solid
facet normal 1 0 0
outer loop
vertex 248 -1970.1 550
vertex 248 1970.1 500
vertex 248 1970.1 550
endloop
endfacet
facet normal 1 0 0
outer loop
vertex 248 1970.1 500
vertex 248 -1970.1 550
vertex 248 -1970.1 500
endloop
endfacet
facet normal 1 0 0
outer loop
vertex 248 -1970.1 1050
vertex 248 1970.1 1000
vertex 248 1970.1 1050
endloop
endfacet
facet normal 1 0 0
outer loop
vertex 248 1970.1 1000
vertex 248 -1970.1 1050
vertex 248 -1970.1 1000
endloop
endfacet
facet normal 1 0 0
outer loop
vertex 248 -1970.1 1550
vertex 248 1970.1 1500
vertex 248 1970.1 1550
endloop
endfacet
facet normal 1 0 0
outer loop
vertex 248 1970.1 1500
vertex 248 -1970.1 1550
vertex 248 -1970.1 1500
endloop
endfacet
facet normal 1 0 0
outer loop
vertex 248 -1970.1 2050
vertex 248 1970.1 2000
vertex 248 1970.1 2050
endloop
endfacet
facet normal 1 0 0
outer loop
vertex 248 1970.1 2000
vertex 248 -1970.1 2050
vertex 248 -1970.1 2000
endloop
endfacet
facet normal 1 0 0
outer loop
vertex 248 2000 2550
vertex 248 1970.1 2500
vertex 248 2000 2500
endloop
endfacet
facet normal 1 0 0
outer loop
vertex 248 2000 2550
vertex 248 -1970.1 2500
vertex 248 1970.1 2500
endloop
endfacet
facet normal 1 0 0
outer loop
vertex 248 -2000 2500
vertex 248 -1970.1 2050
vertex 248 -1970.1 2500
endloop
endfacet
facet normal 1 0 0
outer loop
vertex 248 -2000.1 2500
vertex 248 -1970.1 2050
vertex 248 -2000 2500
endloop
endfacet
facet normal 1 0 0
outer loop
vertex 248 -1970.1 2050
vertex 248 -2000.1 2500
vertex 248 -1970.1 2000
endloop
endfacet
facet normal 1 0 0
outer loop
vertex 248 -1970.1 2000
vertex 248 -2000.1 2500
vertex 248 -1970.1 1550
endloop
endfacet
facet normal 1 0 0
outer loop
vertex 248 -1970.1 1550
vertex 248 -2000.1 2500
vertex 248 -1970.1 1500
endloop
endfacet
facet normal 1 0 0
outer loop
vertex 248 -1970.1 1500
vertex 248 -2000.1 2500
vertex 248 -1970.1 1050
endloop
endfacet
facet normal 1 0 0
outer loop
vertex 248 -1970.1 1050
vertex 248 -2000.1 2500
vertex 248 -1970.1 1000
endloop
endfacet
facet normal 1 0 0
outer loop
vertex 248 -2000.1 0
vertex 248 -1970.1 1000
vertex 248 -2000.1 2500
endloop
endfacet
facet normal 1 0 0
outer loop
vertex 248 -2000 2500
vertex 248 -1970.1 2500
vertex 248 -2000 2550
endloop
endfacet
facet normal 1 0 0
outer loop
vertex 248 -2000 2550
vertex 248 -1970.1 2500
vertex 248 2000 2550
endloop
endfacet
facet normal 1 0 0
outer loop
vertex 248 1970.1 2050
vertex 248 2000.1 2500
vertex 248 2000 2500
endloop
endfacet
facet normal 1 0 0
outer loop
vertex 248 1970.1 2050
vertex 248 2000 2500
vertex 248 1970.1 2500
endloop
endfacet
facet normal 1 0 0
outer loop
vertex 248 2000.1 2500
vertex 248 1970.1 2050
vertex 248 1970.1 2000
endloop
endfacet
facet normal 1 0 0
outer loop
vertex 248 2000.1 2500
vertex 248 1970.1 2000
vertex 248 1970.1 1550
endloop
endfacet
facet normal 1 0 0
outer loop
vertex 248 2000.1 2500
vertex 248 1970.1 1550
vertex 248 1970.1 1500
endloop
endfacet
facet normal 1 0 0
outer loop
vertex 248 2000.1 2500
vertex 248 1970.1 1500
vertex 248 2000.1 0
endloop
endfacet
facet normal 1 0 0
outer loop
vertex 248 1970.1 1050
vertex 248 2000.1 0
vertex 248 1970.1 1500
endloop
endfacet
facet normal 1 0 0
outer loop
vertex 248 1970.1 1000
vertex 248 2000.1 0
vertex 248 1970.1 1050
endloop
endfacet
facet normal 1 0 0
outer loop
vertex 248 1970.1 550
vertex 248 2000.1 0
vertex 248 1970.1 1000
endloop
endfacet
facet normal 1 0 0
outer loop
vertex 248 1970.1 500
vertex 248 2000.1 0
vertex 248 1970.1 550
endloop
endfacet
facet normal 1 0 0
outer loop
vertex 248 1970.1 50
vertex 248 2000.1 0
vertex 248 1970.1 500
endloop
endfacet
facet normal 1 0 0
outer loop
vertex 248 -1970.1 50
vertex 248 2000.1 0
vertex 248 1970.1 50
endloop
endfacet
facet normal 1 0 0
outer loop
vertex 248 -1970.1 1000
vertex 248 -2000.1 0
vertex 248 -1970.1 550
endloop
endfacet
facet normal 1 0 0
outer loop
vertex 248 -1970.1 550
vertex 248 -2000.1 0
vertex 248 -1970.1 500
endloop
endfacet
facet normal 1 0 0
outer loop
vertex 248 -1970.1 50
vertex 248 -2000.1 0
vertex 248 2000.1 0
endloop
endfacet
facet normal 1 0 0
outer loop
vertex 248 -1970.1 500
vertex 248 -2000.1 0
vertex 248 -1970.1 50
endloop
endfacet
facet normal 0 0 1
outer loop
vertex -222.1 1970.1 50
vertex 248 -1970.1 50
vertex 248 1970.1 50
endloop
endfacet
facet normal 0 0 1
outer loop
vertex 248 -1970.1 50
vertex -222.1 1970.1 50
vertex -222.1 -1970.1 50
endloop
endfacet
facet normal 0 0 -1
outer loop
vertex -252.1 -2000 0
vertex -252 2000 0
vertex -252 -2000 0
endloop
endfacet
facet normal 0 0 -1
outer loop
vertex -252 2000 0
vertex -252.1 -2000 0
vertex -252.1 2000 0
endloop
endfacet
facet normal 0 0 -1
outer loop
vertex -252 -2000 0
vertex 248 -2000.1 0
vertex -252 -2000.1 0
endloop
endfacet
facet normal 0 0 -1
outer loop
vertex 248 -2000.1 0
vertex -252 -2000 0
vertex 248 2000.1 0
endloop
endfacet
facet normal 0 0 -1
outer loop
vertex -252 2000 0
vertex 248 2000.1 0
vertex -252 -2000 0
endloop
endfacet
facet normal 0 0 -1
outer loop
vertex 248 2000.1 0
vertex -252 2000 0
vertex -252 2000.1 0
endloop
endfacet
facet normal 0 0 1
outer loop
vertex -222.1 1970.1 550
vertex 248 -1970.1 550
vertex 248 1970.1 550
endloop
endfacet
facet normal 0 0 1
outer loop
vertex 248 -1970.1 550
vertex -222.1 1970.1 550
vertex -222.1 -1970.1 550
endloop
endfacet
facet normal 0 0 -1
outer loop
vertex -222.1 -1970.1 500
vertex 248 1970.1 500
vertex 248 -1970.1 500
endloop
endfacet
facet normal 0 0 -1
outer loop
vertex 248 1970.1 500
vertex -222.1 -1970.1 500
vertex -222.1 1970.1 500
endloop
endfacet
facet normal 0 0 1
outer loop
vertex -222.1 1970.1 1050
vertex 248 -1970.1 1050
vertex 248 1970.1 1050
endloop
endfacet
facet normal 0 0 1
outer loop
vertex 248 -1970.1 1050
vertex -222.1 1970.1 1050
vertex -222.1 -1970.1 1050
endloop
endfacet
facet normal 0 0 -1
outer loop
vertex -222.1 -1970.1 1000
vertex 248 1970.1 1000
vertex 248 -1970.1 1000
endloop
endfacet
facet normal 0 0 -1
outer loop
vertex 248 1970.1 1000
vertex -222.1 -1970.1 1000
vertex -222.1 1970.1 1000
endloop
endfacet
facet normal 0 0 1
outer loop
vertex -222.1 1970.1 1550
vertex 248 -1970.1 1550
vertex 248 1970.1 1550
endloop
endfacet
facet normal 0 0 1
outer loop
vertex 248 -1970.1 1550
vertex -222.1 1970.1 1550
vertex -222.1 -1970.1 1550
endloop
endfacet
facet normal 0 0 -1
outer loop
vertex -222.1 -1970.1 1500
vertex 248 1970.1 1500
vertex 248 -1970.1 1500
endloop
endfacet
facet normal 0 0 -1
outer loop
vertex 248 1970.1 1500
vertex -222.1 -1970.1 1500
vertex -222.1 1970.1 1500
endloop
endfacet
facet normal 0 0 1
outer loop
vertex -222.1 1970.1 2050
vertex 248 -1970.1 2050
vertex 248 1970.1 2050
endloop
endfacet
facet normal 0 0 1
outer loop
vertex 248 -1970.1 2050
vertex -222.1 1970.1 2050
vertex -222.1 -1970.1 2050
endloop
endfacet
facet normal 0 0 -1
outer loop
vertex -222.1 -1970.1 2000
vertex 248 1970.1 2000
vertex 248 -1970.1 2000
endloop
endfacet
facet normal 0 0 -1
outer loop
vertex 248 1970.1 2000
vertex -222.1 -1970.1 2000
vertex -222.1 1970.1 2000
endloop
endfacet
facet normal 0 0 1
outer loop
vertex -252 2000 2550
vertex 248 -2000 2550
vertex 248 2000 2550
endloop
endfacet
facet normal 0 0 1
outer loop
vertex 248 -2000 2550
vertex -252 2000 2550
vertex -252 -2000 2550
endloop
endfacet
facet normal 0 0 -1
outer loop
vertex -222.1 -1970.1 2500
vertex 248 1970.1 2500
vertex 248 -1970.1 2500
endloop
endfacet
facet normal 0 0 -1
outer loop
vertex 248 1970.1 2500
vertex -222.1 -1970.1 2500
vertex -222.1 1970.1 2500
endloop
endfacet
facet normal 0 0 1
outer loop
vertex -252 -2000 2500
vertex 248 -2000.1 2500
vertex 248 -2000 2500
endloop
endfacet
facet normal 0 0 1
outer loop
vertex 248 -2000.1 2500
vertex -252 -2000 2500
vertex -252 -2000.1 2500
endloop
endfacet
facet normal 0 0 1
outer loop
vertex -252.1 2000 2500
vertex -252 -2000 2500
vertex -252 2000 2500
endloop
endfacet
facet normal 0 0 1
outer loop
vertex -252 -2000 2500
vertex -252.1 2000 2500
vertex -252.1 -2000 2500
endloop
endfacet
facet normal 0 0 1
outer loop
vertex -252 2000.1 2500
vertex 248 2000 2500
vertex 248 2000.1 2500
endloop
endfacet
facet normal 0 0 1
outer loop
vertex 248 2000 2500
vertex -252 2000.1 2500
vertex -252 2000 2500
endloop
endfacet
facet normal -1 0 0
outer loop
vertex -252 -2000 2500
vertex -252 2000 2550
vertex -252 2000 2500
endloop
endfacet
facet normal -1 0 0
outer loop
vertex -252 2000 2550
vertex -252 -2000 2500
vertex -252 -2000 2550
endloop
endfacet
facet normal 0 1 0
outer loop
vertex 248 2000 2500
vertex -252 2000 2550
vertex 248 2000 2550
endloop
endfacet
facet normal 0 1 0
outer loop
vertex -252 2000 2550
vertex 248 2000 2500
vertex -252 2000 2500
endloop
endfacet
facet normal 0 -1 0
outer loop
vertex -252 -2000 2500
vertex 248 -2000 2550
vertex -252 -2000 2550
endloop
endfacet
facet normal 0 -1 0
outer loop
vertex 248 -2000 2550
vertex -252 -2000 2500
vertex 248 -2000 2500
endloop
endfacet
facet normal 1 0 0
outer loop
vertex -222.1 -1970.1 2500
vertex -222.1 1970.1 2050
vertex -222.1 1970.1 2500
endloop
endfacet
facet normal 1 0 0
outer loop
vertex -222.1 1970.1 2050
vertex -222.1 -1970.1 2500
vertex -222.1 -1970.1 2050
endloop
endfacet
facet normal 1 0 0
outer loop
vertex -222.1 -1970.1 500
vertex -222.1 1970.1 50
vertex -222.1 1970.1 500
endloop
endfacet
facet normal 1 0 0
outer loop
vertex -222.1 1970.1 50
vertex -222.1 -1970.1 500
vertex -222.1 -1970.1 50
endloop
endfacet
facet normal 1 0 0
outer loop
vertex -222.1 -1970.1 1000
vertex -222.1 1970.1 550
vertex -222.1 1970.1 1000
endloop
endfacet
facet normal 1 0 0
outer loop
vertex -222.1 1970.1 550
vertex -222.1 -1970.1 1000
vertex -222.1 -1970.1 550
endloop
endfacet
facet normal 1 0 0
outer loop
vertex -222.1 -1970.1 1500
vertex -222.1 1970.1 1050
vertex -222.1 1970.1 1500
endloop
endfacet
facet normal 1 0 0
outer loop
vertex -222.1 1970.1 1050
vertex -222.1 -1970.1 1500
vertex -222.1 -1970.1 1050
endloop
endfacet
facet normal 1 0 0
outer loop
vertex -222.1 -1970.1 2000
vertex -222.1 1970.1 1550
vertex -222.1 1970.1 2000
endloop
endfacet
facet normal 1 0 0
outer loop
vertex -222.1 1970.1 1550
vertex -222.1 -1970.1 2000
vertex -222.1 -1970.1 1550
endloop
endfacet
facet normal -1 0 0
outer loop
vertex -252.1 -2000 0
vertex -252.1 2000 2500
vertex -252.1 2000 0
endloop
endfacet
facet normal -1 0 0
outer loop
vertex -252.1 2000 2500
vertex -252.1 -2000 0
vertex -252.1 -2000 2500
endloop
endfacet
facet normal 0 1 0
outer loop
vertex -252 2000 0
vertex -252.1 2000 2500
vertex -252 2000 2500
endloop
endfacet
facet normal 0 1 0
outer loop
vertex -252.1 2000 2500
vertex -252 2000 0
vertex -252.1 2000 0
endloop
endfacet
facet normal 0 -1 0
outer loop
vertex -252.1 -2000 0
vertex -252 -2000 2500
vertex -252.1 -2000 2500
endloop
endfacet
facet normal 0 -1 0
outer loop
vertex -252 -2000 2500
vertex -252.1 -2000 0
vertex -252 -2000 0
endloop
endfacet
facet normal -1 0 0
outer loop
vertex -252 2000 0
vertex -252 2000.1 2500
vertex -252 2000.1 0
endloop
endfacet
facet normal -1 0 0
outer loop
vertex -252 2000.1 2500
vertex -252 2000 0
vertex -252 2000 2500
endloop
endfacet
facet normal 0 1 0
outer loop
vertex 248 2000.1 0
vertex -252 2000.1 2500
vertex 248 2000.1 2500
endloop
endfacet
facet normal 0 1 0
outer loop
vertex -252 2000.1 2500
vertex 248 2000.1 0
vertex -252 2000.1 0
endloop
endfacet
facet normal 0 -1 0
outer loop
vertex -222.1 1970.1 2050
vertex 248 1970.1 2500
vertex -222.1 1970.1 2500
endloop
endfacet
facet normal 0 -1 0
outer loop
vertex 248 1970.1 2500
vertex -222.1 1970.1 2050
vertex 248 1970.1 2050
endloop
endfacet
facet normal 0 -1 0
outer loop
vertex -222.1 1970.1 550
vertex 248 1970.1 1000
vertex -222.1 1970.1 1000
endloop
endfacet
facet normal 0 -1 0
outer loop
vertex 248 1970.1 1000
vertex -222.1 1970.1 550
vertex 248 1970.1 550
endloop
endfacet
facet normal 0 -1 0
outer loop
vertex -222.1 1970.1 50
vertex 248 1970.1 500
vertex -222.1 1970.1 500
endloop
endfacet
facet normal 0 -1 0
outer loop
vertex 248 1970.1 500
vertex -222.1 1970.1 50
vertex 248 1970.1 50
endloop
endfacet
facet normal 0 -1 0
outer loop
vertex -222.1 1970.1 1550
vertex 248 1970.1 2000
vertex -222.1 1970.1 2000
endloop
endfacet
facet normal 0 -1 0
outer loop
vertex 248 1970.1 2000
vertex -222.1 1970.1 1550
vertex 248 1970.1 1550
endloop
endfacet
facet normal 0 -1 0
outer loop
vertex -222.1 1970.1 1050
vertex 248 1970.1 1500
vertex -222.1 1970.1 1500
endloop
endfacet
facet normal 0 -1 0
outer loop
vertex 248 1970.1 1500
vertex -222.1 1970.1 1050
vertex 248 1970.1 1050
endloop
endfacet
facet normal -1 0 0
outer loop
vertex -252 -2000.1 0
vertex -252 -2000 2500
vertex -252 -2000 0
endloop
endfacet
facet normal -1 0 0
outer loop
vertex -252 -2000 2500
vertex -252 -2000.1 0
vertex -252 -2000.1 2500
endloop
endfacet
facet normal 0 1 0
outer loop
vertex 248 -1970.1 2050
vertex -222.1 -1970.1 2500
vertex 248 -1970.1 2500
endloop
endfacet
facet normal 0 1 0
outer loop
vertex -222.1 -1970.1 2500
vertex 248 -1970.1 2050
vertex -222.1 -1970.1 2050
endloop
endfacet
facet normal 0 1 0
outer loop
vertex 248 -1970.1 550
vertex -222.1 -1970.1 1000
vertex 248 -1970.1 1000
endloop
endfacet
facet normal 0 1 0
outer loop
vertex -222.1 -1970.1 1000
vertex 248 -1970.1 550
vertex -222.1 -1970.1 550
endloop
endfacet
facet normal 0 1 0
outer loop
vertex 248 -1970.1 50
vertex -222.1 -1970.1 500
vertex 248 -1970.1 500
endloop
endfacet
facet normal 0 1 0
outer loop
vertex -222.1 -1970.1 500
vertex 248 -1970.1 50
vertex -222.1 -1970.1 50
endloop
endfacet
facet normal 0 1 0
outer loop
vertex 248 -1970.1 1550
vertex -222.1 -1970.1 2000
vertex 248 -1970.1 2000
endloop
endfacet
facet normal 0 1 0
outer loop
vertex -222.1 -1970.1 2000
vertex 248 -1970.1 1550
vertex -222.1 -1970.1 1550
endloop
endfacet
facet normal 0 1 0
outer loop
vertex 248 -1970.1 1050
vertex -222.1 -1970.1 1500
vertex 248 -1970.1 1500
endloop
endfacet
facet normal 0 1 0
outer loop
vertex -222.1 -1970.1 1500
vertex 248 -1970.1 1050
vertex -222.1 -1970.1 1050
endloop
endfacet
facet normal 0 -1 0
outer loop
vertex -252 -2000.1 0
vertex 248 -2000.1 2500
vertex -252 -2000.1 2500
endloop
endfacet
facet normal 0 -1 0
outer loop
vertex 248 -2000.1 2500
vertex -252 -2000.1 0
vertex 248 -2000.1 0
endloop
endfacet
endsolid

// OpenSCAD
// file: barhocker.scad
// scale( [0.001, 0.001, 0.001] )
//  barhocker();
//eps = 1;
//fn = 40;

module barhocker( foot_diameter=500, foot_height=50,
                  foot_rest_diameter = 400, foot_rest_height = 300, foot_rest_thickness = 20,
                  pillar_diameter=70, pillar_height=800,
                  seat_diameter=400, seat_height=130 ) 
{
  color( [0.9, 0.9, 0.9] ) 
    cylinder( d=foot_diameter, h=foot_height, center=false, $fn=fn );
  color( [0.9, 0.9, 0.9] ) 
    translate( [0,0,foot_height-eps] )
      cylinder( d=pillar_diameter, h=pillar_height, center=false, $fn=fn );
  color( [0.9, 0.9, 0.9] ) 
    difference() {
      translate( [0,0,foot_rest_height] )
        cylinder( d=foot_rest_diameter, h=foot_rest_thickness, center=false, $fn=fn );
      translate( [0,0,foot_rest_height-eps] )
        cylinder( d=foot_rest_diameter-2*foot_rest_thickness, 
                  h=foot_rest_thickness+4*eps, center=false, $fn=fn );
      }
  color( [0.6, 0.2, 0.2] ) 
    translate( [0,0,foot_height+pillar_height-eps] )
      cylinder( d=seat_diameter, h=seat_height, center=false, $fn=fn );
}
// main file
fn = 50;
eps = 0.1;

include <barhocker.scad>;



// scale( [0.001, 0.001, 0.001] ) 
//   bartresen();


translate( [-2.0,0,0] )
  // scale( [0.001, 0.001, 0.001] ) 
    cupboard();

/*

//translate( [-1.0, -4.0,,0] )
//  scale( [0.001, 0.001, 0.001] ) side_barrier();
translate( [-1.0, +2.5,,0] )
  scale( [0.001, 0.001, 0.001] ) side_barrier();

translate( [1.0, -1.0, 0.0] )
  scale( [0.001, 0.001, 0.001] ) barhocker();
translate( [1.0, 0.0, 0.0] )
  scale( [0.001, 0.001, 0.001] ) barhocker();
translate( [1.0, 1.0, 0.0] )
  scale( [0.001, 0.001, 0.001] ) barhocker();
*/



module bartresen(
  tresen_length = 3000,
  tresen_width  =  800,
  tresen_height = 1200,
  base_height = 50,        // height of bottom/footer part of the Tresen
  counter_height = 100,    // height of upper table-plate of the Tresen
  inset_height = 500, // clear height of one cupboard on robot side
)
{
  dx = 300; 
  difference() {
    union() {
      color( [0.6, 0.4, 0.2] ) 
        translate( [0,0,tresen_height/2] ) 
          cube( size=[tresen_width, tresen_length, tresen_height], center=true );
      color( [0.6, 0.4, 0.2] ) 
        translate( [0,tresen_length/2,tresen_height/2] ) 
          cylinder( d=tresen_width, h=tresen_height-eps, center=true, $fn = fn );
      color( [0.6, 0.4, 0.2] ) 
        translate( [0,-tresen_length/2,tresen_height/2] ) 
          cylinder( d=tresen_width, h=tresen_height-eps, center=true, $fn = fn );
    }
    translate( [tresen_width/2-dx/2+eps,0,tresen_height/2-base_height/2] )
      cube( size=[dx+10*eps, tresen_length+tresen_width+eps, tresen_height-counter_height-base_height], center=true );

    translate( [-tresen_width/2+dx/2-eps,0,base_height+inset_height/2] )
      cube( size=[dx, tresen_length+tresen_width+eps, inset_height], center=true );
    translate( [-tresen_width/2+dx/2-eps,0,base_height+inset_height+base_height+inset_height/2] )
      cube( size=[dx, tresen_length+tresen_width+eps, inset_height], center=true );
     
  }
}


module cupboard(
  cupboard_length= 4000,
  cupboard_width = 500,
  cupboard_height= 2500,
  base_height    = 50,
  inset_height   = 500,
  wall_thickness = 30,
)
{
  color( [0.6, 0.4, 0.2] ) 
    for( dx=[0:inset_height:cupboard_height] )
      translate( [0,0,base_height/2+dx] )
        cube( size=[cupboard_width,cupboard_length,base_height], center=true );
  // rear wall
  color( [0.6, 0.4, 0.2] ) 
    translate( [-cupboard_width/2+wall_thickness/2-eps,0,cupboard_height/2] )
      cube( size=[wall_thickness, cupboard_length, cupboard_height], center=true );  
  // side walls
  color( [0.6, 0.4, 0.2] ) 
    translate( [0,cupboard_length/2-wall_thickness/2+eps,cupboard_height/2] )
      cube( size=[cupboard_width, wall_thickness, cupboard_height], center=true );  
  color( [0.6, 0.4, 0.2] ) 
    translate( [0,-cupboard_length/2+wall_thickness/2-eps,cupboard_height/2] )
      cube( size=[cupboard_width, wall_thickness, cupboard_height], center=true );  
}


module side_barrier(     
  dx = 2000,
  dy = 200,
  dz = 800,
) 
{

  color( [0.8,0.8,0.8] ) 
    translate( [0,0,dz/2] )
      cube( size=[dx,dy,dz], center=true );

}

  
